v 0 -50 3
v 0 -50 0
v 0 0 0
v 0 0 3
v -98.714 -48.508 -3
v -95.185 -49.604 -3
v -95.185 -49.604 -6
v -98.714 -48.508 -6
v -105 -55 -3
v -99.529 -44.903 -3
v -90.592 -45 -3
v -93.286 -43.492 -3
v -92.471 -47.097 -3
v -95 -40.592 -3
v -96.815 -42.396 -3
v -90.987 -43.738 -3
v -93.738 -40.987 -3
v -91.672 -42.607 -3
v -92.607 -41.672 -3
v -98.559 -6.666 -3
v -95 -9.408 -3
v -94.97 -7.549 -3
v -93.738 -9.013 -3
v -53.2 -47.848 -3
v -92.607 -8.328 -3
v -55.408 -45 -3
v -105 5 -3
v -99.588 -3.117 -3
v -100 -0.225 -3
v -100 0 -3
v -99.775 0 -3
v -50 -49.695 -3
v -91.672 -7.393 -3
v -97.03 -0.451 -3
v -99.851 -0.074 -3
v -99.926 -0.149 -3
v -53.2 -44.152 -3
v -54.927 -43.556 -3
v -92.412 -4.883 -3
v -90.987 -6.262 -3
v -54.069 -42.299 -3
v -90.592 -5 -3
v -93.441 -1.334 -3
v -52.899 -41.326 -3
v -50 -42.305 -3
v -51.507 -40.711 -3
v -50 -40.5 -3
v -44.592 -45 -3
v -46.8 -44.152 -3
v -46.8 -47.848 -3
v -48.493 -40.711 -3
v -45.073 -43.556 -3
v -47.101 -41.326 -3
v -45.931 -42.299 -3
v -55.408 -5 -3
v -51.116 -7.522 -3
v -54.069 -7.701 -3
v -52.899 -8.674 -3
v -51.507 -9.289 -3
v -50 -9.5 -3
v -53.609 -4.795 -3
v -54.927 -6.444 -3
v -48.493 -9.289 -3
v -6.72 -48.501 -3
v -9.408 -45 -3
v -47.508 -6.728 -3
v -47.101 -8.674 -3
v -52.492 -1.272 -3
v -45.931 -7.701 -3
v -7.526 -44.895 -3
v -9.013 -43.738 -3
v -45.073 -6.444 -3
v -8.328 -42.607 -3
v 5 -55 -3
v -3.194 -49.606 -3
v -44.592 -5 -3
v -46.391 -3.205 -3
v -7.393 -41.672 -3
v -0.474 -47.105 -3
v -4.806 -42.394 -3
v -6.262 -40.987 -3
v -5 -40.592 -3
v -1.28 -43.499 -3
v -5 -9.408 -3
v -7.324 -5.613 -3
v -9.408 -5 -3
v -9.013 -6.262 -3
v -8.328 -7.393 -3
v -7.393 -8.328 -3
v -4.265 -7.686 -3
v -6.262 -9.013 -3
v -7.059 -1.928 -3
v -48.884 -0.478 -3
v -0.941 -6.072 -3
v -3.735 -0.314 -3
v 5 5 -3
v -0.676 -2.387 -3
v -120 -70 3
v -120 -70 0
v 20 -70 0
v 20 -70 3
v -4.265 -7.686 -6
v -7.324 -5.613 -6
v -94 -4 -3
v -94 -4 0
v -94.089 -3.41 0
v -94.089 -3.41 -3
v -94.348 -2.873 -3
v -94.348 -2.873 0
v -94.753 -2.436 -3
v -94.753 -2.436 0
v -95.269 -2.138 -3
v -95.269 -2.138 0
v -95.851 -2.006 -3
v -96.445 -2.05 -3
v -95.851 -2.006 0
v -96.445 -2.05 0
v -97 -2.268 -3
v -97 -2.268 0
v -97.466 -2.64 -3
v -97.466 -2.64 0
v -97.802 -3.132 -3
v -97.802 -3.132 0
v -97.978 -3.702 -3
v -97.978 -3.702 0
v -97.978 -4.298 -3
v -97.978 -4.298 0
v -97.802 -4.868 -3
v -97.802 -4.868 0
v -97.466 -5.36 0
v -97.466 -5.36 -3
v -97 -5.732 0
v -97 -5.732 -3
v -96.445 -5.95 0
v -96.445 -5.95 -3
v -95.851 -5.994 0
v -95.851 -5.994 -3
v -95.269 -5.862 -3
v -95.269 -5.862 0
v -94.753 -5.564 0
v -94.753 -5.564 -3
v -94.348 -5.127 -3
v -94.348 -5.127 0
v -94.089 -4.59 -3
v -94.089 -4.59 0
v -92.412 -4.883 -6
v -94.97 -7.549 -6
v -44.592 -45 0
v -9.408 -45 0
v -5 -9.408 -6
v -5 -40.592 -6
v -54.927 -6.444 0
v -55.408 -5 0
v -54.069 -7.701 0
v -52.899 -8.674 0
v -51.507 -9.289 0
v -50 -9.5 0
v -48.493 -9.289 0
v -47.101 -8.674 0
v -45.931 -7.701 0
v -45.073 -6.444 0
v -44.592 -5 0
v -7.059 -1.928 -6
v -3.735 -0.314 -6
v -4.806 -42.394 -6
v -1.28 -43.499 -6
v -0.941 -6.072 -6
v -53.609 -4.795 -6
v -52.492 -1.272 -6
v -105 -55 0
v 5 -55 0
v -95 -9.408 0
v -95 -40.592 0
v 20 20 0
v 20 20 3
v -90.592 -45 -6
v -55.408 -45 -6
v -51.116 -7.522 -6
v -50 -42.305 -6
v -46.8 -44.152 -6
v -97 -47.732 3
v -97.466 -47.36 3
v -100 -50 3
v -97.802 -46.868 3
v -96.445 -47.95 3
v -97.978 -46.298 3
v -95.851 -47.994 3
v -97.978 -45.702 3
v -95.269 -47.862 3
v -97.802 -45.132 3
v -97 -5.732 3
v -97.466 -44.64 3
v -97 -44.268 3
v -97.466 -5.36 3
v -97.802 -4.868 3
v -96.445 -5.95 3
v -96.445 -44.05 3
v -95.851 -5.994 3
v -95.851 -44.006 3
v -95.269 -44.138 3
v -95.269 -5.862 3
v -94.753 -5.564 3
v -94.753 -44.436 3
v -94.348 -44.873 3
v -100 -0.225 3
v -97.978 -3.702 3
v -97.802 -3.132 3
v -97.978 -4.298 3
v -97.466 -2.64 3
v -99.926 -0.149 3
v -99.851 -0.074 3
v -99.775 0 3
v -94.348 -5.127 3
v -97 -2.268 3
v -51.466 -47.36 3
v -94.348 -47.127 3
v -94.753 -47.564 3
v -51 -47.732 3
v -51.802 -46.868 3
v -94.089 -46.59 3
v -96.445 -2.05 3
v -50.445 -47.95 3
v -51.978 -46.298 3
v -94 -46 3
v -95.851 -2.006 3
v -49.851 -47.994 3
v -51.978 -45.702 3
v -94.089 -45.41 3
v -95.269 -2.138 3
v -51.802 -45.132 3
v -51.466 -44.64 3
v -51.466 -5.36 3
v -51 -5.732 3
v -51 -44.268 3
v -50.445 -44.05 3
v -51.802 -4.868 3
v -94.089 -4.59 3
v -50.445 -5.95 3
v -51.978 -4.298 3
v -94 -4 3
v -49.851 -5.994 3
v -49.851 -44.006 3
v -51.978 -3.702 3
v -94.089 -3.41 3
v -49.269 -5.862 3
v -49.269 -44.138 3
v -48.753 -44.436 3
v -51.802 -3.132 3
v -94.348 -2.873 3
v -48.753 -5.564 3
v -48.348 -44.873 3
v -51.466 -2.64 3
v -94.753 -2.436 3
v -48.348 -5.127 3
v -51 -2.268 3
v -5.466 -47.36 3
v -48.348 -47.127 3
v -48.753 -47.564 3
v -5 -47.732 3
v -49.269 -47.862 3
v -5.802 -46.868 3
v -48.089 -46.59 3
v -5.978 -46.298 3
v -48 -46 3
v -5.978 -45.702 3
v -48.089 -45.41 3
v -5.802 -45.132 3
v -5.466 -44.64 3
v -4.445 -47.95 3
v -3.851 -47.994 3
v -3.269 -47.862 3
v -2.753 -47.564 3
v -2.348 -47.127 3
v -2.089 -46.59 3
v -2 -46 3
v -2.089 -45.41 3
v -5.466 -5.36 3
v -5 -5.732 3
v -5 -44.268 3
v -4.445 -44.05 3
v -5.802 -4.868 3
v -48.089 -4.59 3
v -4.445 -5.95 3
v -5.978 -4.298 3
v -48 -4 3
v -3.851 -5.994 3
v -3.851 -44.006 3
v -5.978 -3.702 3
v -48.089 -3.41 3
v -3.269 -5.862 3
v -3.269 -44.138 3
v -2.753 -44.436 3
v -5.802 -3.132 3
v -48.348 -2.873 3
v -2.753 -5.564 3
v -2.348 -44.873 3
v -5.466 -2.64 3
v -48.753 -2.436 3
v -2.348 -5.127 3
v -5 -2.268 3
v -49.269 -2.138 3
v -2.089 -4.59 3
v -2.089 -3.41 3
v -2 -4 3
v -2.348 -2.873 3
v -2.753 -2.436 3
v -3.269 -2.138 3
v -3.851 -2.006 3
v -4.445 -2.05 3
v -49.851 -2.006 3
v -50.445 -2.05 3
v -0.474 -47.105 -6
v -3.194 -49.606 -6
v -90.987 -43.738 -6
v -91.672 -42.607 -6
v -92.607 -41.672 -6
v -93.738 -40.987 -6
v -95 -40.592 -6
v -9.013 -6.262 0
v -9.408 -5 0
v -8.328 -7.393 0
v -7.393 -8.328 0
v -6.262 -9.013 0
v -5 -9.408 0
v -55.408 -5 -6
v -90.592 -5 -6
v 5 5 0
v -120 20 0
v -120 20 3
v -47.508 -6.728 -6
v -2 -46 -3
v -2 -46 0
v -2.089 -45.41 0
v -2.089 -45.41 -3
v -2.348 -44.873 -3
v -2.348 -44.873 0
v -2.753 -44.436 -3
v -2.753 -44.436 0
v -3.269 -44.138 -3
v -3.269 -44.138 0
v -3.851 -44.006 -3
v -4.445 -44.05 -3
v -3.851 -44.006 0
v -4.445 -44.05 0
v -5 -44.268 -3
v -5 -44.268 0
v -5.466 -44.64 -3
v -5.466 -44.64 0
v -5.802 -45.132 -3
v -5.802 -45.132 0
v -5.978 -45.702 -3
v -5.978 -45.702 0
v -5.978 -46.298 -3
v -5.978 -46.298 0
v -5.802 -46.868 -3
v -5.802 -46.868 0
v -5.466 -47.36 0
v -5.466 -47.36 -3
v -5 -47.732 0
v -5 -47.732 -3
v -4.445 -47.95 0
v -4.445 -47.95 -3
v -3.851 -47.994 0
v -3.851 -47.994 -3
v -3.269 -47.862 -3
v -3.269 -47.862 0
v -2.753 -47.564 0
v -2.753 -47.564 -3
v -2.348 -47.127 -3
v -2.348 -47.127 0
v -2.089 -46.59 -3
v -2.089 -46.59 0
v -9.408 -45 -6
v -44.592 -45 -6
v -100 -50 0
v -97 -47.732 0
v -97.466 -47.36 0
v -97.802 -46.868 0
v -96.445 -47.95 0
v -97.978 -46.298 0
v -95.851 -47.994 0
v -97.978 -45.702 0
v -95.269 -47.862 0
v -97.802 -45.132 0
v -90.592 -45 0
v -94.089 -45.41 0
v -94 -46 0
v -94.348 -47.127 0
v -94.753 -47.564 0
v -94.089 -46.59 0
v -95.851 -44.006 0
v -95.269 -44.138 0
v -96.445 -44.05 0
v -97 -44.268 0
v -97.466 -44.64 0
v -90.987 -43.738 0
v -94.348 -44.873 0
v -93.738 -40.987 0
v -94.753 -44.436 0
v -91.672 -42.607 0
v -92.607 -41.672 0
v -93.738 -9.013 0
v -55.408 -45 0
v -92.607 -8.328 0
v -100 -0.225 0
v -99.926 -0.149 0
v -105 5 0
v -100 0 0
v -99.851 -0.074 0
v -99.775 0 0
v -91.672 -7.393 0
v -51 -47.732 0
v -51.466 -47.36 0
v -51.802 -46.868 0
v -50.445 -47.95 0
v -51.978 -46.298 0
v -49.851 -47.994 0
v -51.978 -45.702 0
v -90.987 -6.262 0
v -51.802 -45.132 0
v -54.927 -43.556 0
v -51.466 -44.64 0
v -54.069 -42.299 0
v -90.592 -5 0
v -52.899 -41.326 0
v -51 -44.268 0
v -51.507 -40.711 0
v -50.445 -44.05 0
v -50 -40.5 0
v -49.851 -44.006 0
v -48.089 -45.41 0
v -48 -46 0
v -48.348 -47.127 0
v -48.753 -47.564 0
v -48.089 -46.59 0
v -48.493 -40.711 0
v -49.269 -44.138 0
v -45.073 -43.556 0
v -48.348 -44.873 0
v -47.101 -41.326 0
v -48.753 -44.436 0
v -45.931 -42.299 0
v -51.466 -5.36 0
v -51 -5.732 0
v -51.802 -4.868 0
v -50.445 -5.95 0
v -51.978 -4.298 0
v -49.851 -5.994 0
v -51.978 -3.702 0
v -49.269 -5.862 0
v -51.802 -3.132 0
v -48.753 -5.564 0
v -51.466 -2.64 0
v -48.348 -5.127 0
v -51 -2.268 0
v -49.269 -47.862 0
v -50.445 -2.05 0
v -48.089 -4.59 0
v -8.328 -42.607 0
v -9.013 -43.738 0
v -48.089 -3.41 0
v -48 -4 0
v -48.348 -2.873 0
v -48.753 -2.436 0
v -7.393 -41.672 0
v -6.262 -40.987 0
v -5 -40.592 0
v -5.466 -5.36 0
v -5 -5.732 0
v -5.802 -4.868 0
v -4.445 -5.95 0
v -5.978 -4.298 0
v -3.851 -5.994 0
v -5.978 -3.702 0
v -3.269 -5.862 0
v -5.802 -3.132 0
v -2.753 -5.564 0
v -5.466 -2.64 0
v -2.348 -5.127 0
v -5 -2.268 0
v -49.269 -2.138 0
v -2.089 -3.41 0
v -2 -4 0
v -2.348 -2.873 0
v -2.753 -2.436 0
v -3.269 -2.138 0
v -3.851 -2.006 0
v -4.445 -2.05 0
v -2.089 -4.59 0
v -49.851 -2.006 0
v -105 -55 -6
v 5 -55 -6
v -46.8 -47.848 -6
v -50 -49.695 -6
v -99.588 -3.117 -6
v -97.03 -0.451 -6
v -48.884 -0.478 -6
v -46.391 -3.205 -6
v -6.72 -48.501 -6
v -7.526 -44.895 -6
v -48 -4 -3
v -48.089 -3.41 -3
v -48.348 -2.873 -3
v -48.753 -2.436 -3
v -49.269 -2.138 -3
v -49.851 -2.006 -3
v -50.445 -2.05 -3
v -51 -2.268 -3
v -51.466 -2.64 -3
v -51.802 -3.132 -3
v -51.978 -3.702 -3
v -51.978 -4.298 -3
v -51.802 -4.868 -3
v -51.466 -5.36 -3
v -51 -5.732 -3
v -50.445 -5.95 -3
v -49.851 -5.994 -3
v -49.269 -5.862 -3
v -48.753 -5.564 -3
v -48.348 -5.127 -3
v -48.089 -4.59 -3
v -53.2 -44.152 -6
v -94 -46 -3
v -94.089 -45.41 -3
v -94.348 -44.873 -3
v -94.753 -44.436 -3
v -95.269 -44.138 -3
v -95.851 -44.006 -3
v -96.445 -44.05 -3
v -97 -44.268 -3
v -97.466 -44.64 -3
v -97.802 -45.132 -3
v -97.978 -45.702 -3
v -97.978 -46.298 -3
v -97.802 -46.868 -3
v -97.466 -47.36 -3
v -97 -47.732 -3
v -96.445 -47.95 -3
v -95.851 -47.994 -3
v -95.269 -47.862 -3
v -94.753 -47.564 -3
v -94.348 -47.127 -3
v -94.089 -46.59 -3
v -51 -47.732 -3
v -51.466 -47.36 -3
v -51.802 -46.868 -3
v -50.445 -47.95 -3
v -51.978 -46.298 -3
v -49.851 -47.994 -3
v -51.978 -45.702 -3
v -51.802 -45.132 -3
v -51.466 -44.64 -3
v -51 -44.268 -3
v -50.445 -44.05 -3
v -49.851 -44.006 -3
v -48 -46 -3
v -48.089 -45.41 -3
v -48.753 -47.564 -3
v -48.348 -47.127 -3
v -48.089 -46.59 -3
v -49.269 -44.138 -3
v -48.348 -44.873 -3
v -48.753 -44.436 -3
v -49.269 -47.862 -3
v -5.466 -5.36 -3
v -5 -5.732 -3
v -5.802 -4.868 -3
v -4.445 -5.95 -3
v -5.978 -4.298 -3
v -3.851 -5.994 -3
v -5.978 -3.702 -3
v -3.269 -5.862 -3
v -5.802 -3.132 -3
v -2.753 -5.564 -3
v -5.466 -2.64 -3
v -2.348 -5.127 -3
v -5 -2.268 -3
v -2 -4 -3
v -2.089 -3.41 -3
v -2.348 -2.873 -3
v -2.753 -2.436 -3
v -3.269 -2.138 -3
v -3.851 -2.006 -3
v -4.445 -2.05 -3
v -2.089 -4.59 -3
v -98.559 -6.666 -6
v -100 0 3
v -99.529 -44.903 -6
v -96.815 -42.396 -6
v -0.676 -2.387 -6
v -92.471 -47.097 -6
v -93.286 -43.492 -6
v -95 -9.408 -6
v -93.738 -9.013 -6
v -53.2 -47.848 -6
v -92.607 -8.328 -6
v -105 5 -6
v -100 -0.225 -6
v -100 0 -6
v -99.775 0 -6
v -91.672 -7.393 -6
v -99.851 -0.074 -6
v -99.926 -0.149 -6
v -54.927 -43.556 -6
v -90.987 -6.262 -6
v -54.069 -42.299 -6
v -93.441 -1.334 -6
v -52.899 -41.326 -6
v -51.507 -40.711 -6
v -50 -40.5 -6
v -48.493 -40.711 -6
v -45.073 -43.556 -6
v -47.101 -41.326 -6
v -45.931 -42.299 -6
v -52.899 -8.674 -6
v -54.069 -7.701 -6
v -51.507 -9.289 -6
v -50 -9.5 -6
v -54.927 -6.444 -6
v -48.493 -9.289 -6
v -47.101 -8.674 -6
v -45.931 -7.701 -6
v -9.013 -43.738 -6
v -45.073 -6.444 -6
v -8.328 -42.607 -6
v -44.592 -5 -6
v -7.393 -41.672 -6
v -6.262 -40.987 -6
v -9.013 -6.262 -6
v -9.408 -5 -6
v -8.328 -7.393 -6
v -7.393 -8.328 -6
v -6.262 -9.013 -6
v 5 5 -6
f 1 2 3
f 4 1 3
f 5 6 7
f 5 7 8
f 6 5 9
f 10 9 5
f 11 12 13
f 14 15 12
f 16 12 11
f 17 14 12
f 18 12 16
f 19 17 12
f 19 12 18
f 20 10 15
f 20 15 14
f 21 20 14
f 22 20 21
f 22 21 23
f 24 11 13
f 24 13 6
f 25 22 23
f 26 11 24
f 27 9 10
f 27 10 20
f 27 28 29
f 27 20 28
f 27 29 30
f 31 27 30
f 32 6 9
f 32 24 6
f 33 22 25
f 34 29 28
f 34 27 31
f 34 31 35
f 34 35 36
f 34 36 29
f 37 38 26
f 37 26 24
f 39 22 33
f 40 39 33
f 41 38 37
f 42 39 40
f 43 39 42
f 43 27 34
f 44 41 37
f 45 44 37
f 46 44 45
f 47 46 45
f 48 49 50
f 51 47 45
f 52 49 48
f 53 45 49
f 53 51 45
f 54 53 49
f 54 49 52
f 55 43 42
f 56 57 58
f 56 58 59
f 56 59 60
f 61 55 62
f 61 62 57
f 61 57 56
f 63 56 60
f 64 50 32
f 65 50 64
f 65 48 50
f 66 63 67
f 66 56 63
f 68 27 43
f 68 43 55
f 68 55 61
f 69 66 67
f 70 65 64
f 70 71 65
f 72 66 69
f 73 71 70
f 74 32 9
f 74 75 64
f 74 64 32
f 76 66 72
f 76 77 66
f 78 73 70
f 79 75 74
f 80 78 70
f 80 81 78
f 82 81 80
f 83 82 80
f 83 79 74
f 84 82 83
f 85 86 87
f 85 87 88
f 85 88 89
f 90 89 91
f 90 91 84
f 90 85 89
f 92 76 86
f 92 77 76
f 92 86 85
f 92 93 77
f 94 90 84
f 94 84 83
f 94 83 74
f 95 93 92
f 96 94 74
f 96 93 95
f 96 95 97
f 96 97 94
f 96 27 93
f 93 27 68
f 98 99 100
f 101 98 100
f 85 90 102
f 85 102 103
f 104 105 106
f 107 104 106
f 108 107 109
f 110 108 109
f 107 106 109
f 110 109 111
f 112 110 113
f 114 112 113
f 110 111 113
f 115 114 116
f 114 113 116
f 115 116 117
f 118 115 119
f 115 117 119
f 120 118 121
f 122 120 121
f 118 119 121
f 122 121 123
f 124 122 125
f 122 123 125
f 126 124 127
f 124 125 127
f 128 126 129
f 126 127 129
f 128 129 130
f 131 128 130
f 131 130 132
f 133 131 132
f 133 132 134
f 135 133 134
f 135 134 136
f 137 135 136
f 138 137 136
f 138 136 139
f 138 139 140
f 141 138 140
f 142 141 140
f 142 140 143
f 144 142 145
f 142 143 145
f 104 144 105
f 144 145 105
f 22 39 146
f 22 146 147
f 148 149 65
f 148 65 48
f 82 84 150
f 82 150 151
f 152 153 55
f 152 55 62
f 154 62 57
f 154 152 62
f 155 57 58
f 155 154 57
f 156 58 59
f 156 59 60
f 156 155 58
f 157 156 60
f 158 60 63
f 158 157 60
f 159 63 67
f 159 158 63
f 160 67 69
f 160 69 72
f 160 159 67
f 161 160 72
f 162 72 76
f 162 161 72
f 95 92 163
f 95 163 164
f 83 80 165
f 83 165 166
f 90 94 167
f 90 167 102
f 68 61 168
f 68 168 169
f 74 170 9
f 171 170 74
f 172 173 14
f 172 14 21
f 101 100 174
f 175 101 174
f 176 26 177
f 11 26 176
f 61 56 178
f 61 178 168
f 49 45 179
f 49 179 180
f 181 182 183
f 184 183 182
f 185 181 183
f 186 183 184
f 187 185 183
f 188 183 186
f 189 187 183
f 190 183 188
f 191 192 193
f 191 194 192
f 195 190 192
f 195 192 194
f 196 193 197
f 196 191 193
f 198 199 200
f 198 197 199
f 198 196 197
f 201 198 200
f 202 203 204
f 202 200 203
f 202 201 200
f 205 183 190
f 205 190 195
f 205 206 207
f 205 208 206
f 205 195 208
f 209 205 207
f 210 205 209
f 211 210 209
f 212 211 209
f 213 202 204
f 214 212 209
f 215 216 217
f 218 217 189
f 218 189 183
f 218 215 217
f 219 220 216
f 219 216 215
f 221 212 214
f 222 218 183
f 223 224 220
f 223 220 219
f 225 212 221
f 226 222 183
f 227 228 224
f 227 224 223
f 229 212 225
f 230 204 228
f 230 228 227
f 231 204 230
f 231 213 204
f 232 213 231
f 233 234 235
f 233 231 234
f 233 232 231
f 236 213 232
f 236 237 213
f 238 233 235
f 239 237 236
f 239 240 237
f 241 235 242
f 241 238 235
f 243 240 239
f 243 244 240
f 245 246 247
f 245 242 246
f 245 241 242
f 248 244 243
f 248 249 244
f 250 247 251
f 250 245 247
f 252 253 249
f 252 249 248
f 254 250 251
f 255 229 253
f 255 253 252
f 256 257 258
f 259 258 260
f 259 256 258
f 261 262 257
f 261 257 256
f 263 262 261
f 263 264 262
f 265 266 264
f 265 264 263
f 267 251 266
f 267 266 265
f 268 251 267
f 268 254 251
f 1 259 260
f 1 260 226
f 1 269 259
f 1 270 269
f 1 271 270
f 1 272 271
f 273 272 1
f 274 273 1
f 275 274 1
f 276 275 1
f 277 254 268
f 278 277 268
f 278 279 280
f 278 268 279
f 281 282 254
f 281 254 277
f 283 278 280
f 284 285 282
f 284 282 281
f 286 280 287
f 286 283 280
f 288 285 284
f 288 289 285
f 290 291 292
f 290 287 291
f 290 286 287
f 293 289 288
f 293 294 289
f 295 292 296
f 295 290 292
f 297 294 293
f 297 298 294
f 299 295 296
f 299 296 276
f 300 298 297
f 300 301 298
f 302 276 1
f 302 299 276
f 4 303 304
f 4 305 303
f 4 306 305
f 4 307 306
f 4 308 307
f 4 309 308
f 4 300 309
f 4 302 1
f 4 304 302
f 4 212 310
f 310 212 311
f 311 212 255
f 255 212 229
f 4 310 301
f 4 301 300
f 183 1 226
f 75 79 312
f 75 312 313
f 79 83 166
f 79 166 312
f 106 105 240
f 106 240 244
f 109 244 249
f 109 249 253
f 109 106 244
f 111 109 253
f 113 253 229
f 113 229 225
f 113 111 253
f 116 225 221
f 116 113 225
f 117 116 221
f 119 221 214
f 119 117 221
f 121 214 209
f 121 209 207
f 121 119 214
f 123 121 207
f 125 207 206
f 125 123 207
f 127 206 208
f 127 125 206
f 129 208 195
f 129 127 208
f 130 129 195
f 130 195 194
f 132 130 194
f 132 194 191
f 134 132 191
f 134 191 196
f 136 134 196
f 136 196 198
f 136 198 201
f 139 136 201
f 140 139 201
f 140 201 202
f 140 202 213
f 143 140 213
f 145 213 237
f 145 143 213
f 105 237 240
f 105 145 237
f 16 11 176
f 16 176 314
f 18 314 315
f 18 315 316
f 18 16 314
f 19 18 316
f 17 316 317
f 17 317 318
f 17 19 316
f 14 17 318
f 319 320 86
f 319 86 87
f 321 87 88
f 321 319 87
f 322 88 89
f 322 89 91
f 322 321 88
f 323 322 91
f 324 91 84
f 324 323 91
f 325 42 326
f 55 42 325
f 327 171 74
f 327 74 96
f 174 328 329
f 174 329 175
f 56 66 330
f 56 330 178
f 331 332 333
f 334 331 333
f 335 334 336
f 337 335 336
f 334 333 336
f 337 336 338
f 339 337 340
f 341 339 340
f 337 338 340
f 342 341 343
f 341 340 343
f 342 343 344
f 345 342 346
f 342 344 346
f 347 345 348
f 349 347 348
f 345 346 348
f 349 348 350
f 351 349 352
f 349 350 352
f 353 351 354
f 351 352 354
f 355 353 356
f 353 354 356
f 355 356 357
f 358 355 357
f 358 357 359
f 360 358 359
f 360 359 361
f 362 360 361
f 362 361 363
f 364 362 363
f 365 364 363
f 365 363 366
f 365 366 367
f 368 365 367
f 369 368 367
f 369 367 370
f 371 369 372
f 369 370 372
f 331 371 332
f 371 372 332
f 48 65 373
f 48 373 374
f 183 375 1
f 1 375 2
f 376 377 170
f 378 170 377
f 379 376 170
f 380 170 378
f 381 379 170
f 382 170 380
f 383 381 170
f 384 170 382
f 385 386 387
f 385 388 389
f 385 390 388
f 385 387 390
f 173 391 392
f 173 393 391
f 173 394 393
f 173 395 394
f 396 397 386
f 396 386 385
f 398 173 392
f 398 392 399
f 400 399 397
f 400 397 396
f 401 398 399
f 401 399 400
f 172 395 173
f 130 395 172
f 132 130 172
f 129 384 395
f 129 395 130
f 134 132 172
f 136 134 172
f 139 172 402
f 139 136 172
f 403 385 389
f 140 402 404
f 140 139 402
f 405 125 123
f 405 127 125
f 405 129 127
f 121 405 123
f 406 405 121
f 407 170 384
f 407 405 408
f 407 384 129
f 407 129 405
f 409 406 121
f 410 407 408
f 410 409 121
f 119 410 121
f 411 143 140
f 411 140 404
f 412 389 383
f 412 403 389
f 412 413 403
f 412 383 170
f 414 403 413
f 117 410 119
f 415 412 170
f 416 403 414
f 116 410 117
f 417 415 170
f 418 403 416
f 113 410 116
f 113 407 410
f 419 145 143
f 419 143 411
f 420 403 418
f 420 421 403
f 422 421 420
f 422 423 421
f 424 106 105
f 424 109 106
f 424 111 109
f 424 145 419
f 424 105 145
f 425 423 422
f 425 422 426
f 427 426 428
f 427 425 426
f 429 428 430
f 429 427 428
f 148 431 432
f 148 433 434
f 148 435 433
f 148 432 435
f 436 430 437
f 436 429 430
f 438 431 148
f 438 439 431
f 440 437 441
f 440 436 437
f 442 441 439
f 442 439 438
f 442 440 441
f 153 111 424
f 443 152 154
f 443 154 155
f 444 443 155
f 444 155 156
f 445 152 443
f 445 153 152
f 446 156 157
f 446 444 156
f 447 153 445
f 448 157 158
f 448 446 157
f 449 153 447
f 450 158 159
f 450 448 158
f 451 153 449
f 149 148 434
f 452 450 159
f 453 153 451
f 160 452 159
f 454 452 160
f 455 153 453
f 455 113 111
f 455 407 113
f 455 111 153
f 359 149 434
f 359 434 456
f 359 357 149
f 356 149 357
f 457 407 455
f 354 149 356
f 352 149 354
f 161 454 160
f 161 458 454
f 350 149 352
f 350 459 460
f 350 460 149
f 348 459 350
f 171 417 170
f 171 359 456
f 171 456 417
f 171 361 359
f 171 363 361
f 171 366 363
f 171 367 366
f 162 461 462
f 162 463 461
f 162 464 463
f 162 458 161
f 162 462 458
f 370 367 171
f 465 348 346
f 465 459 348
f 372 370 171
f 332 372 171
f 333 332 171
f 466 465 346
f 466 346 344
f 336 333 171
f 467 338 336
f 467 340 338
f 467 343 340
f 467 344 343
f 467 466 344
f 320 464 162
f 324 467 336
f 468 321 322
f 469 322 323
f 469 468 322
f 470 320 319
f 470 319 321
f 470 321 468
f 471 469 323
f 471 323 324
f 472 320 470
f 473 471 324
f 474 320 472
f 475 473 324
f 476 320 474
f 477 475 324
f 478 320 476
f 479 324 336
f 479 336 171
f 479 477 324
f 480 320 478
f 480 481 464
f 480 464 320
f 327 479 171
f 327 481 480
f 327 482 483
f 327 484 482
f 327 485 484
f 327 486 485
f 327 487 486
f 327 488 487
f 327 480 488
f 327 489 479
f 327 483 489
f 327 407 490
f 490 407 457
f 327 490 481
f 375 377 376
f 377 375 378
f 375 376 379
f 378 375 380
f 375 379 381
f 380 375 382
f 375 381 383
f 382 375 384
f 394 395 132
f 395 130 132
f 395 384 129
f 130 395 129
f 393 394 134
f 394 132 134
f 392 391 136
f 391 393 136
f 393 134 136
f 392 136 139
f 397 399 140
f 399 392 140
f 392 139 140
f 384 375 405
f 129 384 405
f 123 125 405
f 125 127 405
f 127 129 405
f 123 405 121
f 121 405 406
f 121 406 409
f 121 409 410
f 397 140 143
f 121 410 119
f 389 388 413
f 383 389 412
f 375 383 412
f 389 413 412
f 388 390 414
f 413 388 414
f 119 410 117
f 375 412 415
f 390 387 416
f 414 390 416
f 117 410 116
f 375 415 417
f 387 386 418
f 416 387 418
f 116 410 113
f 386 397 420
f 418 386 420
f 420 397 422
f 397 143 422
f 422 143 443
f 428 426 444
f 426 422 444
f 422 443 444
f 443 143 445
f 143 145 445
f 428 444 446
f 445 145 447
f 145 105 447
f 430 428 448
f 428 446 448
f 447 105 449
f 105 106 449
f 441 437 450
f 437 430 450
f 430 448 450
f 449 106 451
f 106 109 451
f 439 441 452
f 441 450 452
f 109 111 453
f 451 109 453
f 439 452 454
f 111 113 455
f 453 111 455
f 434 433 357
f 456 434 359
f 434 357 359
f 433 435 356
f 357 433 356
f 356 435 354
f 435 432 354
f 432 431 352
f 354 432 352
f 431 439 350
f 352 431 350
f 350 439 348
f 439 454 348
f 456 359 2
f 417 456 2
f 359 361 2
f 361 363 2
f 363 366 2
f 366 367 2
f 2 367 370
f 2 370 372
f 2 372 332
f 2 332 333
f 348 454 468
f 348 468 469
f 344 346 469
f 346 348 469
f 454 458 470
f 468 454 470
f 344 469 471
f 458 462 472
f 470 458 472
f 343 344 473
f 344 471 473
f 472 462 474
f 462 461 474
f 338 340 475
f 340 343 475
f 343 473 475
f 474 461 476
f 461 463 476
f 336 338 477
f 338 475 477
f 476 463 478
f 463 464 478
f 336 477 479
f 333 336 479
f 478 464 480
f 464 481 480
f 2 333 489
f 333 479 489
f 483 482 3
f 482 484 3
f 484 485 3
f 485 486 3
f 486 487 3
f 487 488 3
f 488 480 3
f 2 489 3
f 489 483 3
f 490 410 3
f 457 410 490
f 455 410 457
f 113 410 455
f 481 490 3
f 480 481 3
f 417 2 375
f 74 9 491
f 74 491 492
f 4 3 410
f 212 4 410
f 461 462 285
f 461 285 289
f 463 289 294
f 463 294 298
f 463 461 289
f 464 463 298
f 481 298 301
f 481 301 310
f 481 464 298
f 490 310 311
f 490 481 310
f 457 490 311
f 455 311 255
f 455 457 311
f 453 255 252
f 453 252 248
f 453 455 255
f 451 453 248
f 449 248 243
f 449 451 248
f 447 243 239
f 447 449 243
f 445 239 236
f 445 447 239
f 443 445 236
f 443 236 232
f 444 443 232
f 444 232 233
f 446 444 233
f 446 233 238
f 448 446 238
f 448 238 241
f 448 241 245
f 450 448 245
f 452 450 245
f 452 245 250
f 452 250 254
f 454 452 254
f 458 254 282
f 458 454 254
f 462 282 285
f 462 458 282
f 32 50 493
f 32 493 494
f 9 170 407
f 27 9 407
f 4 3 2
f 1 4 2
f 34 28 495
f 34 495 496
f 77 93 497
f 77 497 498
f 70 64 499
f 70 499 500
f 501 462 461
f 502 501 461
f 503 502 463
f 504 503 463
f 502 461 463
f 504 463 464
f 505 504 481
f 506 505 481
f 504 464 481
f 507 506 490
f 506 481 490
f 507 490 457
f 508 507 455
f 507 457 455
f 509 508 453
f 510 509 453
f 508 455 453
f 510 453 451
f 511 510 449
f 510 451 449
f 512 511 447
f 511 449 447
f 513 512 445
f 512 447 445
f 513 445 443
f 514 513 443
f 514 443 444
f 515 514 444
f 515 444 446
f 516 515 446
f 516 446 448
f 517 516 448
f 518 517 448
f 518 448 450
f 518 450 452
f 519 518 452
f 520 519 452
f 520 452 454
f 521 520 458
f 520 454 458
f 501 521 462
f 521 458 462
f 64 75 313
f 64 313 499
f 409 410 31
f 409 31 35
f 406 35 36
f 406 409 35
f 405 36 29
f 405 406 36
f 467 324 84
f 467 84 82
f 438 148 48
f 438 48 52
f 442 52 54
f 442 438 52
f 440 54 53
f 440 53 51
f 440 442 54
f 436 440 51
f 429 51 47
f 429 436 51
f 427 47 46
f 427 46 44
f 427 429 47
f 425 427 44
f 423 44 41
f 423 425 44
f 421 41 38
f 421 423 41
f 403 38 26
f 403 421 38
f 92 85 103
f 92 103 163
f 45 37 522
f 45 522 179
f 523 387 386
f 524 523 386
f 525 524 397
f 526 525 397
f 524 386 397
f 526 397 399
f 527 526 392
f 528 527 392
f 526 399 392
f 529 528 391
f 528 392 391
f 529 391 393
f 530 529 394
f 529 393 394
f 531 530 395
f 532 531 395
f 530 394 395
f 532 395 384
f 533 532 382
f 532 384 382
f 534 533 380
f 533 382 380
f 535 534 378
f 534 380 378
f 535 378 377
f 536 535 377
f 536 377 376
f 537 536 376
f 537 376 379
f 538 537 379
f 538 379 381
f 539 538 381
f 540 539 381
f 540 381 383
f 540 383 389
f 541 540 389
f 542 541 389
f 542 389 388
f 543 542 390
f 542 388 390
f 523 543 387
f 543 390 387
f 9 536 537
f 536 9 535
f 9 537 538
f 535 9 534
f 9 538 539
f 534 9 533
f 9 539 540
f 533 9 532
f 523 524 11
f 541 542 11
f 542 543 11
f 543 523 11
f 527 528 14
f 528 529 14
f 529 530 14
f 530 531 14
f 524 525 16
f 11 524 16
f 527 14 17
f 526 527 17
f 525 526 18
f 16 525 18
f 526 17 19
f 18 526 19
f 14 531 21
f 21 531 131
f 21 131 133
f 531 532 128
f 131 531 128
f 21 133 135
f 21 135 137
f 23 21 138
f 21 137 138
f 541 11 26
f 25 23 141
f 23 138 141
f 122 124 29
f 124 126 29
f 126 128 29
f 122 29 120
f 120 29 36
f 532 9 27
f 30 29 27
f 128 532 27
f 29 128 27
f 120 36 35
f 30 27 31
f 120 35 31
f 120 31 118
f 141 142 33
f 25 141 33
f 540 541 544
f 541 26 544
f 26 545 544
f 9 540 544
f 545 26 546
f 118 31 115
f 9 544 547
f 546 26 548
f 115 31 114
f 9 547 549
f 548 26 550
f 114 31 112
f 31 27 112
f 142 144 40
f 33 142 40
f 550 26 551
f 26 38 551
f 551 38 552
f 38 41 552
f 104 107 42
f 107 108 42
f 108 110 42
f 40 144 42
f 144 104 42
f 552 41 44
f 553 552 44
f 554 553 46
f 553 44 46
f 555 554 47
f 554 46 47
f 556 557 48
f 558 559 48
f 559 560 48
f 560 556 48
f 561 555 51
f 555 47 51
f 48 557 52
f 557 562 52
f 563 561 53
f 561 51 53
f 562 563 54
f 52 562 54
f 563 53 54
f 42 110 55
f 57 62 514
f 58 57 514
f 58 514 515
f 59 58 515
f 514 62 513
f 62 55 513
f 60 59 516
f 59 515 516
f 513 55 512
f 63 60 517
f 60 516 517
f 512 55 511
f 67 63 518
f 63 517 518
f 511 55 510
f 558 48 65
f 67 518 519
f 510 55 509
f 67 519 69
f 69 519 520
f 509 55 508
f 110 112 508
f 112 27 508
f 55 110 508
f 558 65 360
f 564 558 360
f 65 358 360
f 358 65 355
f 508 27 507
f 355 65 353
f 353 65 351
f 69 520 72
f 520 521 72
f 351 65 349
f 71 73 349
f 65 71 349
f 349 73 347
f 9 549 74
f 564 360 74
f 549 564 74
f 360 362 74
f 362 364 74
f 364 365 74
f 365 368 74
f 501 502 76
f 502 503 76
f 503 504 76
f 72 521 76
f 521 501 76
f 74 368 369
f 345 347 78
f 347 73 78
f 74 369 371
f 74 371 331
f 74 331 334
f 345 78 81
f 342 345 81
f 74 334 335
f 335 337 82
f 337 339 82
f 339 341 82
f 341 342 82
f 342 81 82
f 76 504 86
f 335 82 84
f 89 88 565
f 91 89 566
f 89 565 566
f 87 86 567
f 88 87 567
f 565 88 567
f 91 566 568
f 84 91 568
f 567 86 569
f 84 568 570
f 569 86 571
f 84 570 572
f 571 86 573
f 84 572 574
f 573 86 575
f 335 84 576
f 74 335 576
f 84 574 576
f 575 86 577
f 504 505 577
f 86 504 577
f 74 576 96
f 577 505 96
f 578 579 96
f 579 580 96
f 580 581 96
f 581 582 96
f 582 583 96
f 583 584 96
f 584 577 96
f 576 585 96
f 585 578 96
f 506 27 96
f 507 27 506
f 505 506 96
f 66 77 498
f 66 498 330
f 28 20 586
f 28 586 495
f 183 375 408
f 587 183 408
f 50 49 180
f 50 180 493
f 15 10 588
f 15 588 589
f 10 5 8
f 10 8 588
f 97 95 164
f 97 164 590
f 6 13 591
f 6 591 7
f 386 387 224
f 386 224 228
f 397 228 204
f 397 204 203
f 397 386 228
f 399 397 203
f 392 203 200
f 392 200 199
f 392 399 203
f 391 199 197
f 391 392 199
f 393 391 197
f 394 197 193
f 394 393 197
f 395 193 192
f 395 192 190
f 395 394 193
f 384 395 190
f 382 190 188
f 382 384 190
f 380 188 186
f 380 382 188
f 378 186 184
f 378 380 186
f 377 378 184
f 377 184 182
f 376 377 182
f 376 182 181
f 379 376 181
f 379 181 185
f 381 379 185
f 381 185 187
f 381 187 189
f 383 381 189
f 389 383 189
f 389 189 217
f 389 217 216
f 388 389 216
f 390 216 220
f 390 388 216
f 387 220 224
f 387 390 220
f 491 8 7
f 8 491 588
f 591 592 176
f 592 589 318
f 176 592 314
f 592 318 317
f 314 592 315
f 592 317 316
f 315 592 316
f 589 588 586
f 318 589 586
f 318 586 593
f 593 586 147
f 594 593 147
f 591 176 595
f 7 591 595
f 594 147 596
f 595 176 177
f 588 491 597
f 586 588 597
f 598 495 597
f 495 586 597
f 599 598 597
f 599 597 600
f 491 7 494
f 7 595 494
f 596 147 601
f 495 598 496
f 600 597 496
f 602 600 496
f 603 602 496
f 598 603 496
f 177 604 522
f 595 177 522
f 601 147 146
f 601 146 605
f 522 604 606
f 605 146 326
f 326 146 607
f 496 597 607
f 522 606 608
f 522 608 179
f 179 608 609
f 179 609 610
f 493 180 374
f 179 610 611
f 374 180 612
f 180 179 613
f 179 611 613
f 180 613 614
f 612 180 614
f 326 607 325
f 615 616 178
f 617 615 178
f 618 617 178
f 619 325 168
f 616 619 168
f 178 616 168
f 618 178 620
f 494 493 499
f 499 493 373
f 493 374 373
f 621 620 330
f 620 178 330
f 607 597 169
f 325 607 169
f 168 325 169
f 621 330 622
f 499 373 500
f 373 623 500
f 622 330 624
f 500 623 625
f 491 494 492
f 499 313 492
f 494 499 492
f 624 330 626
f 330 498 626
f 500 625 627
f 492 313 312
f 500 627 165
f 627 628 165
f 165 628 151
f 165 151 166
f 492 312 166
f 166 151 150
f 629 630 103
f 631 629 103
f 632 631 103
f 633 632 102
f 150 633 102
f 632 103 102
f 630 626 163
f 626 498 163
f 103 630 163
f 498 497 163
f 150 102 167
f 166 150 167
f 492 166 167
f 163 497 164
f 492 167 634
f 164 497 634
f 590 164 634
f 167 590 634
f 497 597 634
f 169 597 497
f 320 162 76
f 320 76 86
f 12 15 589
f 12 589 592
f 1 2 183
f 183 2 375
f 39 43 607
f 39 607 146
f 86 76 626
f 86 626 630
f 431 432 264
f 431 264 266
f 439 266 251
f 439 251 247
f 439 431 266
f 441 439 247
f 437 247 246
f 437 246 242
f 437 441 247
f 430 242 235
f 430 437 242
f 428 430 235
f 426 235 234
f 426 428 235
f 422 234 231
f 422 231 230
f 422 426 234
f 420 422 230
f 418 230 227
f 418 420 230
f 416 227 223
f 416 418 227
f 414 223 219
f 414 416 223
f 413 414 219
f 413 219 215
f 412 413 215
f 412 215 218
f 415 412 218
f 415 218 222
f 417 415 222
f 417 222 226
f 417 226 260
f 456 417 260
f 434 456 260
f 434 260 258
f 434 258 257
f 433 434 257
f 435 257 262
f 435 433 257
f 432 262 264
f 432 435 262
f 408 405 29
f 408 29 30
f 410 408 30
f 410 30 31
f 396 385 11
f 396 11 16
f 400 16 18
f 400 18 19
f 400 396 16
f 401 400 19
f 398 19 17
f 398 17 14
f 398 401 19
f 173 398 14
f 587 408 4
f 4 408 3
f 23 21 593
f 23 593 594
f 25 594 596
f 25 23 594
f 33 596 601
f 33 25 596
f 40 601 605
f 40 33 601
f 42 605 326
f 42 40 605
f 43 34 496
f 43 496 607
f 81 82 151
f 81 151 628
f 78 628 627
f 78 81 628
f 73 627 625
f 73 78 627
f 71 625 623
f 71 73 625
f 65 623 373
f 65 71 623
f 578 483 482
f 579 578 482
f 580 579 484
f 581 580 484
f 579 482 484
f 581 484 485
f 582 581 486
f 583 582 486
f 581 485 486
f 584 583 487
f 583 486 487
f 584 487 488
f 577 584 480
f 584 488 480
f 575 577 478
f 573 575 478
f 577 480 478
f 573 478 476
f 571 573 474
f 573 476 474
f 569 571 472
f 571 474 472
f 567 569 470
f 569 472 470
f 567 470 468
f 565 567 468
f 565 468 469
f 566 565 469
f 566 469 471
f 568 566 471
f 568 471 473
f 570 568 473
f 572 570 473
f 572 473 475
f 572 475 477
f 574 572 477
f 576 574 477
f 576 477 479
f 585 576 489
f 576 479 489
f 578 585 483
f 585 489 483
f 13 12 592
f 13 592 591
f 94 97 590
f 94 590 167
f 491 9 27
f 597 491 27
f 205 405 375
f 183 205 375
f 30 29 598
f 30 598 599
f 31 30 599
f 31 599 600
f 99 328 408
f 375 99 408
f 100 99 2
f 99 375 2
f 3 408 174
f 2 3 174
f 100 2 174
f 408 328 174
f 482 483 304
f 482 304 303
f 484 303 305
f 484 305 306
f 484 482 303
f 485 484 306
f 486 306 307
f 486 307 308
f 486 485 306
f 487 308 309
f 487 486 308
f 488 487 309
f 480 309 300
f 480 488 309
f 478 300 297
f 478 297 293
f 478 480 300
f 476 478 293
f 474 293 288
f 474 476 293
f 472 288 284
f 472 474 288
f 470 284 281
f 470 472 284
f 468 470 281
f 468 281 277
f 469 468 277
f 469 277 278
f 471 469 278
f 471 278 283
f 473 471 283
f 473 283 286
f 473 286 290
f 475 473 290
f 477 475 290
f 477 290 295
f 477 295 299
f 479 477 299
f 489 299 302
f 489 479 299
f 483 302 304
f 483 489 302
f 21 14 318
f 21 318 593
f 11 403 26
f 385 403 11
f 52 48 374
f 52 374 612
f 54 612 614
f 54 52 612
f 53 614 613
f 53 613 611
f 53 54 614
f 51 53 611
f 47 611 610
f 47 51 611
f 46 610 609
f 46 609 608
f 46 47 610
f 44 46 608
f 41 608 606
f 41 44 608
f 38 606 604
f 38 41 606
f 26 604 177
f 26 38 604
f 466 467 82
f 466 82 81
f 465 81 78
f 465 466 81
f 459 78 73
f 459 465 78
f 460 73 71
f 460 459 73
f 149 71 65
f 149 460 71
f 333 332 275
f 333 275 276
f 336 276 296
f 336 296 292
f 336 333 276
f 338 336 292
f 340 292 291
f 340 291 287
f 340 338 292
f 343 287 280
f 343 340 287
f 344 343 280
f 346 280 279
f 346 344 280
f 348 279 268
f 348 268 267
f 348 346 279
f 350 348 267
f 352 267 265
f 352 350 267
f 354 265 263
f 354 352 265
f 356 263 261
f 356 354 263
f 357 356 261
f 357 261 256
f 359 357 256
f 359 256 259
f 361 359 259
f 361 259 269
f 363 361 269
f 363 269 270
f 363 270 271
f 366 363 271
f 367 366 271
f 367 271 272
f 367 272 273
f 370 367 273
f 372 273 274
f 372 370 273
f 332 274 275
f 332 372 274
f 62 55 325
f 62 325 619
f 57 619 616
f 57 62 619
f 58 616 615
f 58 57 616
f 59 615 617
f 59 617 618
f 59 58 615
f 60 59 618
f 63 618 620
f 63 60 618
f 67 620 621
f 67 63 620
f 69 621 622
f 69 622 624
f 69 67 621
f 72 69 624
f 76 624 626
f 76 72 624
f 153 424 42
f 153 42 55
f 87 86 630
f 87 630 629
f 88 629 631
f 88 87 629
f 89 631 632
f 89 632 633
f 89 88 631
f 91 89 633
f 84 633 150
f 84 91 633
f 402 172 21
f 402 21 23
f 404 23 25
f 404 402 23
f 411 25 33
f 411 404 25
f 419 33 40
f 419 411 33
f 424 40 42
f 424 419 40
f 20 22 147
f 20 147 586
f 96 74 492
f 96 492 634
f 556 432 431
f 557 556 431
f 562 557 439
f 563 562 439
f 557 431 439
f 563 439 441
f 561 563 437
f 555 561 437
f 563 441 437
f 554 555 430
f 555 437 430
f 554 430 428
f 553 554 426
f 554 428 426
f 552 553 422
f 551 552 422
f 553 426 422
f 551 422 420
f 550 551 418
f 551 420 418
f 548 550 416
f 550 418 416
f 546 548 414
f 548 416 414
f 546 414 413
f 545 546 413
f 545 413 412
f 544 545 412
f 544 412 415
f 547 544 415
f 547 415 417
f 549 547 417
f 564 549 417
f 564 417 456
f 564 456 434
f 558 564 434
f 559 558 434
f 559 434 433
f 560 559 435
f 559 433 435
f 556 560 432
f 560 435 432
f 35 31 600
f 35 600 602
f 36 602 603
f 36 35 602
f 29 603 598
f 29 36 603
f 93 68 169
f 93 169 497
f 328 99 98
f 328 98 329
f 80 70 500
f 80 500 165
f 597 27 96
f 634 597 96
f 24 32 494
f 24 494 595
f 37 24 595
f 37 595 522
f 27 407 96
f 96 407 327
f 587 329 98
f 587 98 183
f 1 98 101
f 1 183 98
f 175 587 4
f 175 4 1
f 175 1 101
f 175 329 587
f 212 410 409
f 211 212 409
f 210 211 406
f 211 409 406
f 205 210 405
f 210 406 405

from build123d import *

# Parameters (mm, degrees)
F0_W     = 140
F0_H     = 90
F0_W_2   = 110
F0_H_2   = 60
F1_DEPTH = 3
F0_R     = 2
F2_DEPTH = 3
F3_DEPTH = 3
F4_START = -3
F4_DEPTH = 3


with BuildPart() as f1:
    # F0 (on Top) → F1 (new body)
    with BuildSketch(Plane.XY):
        with Locations((-50, -25)):
            Rectangle(F0_W, F0_H)
        with Locations((-50, -25)):
            Rectangle(F0_W_2, F0_H_2, mode=Mode.SUBTRACT)
        with Locations((-50, -25)):
            Rectangle(F0_W_2, F0_H_2)
        Polygon((-99.7749172176, 0), (0, 0), (0, -50), (-100, -50), (-100, -0.2250827824), (-100, 0), align=None, mode=Mode.SUBTRACT)
    extrude(amount=F1_DEPTH)


with BuildPart() as f2:
    # F0 (on Top) → F2 (new body)
    with BuildSketch(Plane.XY):
        with Locations((-50, -25)):
            Rectangle(F0_W_2, F0_H_2)
        Polygon((-99.7749172176, 0), (0, 0), (0, -50), (-100, -50), (-100, -0.2250827824), (-100, 0), align=None, mode=Mode.SUBTRACT)
        with BuildLine():
            Line((0, -50), (0, 0))
            Line((0, 0), (-99.7749172176, 0))
            ThreePointArc((-99.7749172176, 0), (-99.8890872965, -0.1109127035), (-100, -0.2250827824))
            Line((-100, -0.2250827824), (-100, -50))
            Line((-100, -50), (0, -50))
        make_face()
        Polygon((-99.5285949818, -44.9034824272), (-96.8146854172, -42.3958883197), (-93.2860904353, -43.4924058925), (-92.4714050182, -47.0965175728), (-95.1853145828, -49.6041116803), (-98.7139095647, -48.5075941075), align=None, mode=Mode.SUBTRACT)
        Polygon((-50, -42.3049582772), (-46.8, -44.1524791386), (-46.8, -47.8475208614), (-50, -49.6950417228), (-53.2, -47.8475208614), (-53.2, -44.1524791386), align=None, mode=Mode.SUBTRACT)
        Polygon((-6.7200378526, -48.500945304), (-7.5259010931, -44.8948507724), (-4.8058632405, -42.3939054684), (-1.2799621474, -43.499054696), (-0.4740989069, -47.1051492276), (-3.1941367595, -49.6060945316), align=None, mode=Mode.SUBTRACT)
        Polygon((-93.441469611, -1.334056343), (-92.4119598735, -4.8827804847), (-94.9704902625, -7.5487241417), (-98.558530389, -6.665943657), (-99.5880401265, -3.1172195153), (-97.0295097375, -0.4512758583), align=None, mode=Mode.SUBTRACT)
        with BuildLine():
            Line((-44.5916730868, -5), (-9.4083269132, -5))
            ThreePointArc((-9.4083269132, -5), (-7.8890872965, -7.8890872965), (-5, -9.4083269132))
            Line((-5, -9.4083269132), (-5, -40.5916730868))
            ThreePointArc((-5, -40.5916730868), (-7.8890872965, -42.1109127035), (-9.4083269132, -45))
            Line((-9.4083269132, -45), (-44.5916730868, -45))
            ThreePointArc((-44.5916730868, -45), (-50, -40.5), (-55.4083269132, -45))
            Line((-55.4083269132, -45), (-90.5916730868, -45))
            ThreePointArc((-90.5916730868, -45), (-92.1109127035, -42.1109127035), (-95, -40.5916730868))
            Line((-95, -40.5916730868), (-95, -9.4083269132))
            ThreePointArc((-95, -9.4083269132), (-92.1109127035, -7.8890872965), (-90.5916730868, -5))
            Line((-90.5916730868, -5), (-55.4083269132, -5))
            ThreePointArc((-55.4083269132, -5), (-50, -9.5), (-44.5916730868, -5))
        make_face(mode=Mode.SUBTRACT)
        Polygon((-46.3913899472, -3.2054769858), (-47.5076178594, -6.727886471), (-51.1162279122, -7.5224094852), (-53.6086100528, -4.7945230142), (-52.4923821406, -1.272113529), (-48.8837720878, -0.4775905148), align=None, mode=Mode.SUBTRACT)
        Polygon((-0.6758070303, -2.3865953906), (-0.9406541368, -6.0721332541), (-4.2648471065, -7.6855378635), (-7.3241929697, -5.6134046094), (-7.0593458632, -1.9278667459), (-3.7351528935, -0.3144621365), align=None, mode=Mode.SUBTRACT)
        Polygon((-93.2860904353, -43.4924058925), (-96.8146854172, -42.3958883197), (-99.5285949818, -44.9034824272), (-98.7139095647, -48.5075941075), (-95.1853145828, -49.6041116803), (-92.4714050182, -47.0965175728), align=None)
        with Locations((-96, -46)):
            Circle(F0_R, mode=Mode.SUBTRACT)
        Polygon((-94.9704902625, -7.5487241417), (-92.4119598735, -4.8827804847), (-93.441469611, -1.334056343), (-97.0295097375, -0.4512758583), (-99.5880401265, -3.1172195153), (-98.558530389, -6.665943657), align=None)
        with Locations((-96, -4)):
            Circle(F0_R, mode=Mode.SUBTRACT)
        Polygon((-46.8, -47.8475208614), (-46.8, -44.1524791386), (-50, -42.3049582772), (-53.2, -44.1524791386), (-53.2, -47.8475208614), (-50, -49.6950417228), align=None)
        with Locations((-50, -46)):
            Circle(F0_R, mode=Mode.SUBTRACT)
        Polygon((-51.1162279122, -7.5224094852), (-47.5076178594, -6.727886471), (-46.3913899472, -3.2054769858), (-48.8837720878, -0.4775905148), (-52.4923821406, -1.272113529), (-53.6086100528, -4.7945230142), align=None)
        with Locations((-50, -4)):
            Circle(F0_R, mode=Mode.SUBTRACT)
        Polygon((-4.2648471065, -7.6855378635), (-0.9406541368, -6.0721332541), (-0.6758070303, -2.3865953906), (-3.7351528935, -0.3144621365), (-7.0593458632, -1.9278667459), (-7.3241929697, -5.6134046094), align=None)
        with Locations((-4, -4)):
            Circle(F0_R, mode=Mode.SUBTRACT)
        Polygon((-4.8058632405, -42.3939054684), (-7.5259010931, -44.8948507724), (-6.7200378526, -48.500945304), (-3.1941367595, -49.6060945316), (-0.4740989069, -47.1051492276), (-1.2799621474, -43.499054696), align=None)
        with Locations((-4, -46)):
            Circle(F0_R, mode=Mode.SUBTRACT)
    extrude(amount=-F2_DEPTH)


with BuildPart() as f3:
    # F0 (on Top) → F3 (new body)
    with BuildSketch(Plane.XY):
        with BuildLine():
            Line((0, -50), (0, 0))
            Line((0, 0), (-99.7749172176, 0))
            ThreePointArc((-99.7749172176, 0), (-99.8890872965, -0.1109127035), (-100, -0.2250827824))
            Line((-100, -0.2250827824), (-100, -50))
            Line((-100, -50), (0, -50))
        make_face()
        Polygon((-99.5285949818, -44.9034824272), (-96.8146854172, -42.3958883197), (-93.2860904353, -43.4924058925), (-92.4714050182, -47.0965175728), (-95.1853145828, -49.6041116803), (-98.7139095647, -48.5075941075), align=None, mode=Mode.SUBTRACT)
        Polygon((-50, -42.3049582772), (-46.8, -44.1524791386), (-46.8, -47.8475208614), (-50, -49.6950417228), (-53.2, -47.8475208614), (-53.2, -44.1524791386), align=None, mode=Mode.SUBTRACT)
        Polygon((-6.7200378526, -48.500945304), (-7.5259010931, -44.8948507724), (-4.8058632405, -42.3939054684), (-1.2799621474, -43.499054696), (-0.4740989069, -47.1051492276), (-3.1941367595, -49.6060945316), align=None, mode=Mode.SUBTRACT)
        Polygon((-93.441469611, -1.334056343), (-92.4119598735, -4.8827804847), (-94.9704902625, -7.5487241417), (-98.558530389, -6.665943657), (-99.5880401265, -3.1172195153), (-97.0295097375, -0.4512758583), align=None, mode=Mode.SUBTRACT)
        with BuildLine():
            Line((-44.5916730868, -5), (-9.4083269132, -5))
            ThreePointArc((-9.4083269132, -5), (-7.8890872965, -7.8890872965), (-5, -9.4083269132))
            Line((-5, -9.4083269132), (-5, -40.5916730868))
            ThreePointArc((-5, -40.5916730868), (-7.8890872965, -42.1109127035), (-9.4083269132, -45))
            Line((-9.4083269132, -45), (-44.5916730868, -45))
            ThreePointArc((-44.5916730868, -45), (-50, -40.5), (-55.4083269132, -45))
            Line((-55.4083269132, -45), (-90.5916730868, -45))
            ThreePointArc((-90.5916730868, -45), (-92.1109127035, -42.1109127035), (-95, -40.5916730868))
            Line((-95, -40.5916730868), (-95, -9.4083269132))
            ThreePointArc((-95, -9.4083269132), (-92.1109127035, -7.8890872965), (-90.5916730868, -5))
            Line((-90.5916730868, -5), (-55.4083269132, -5))
            ThreePointArc((-55.4083269132, -5), (-50, -9.5), (-44.5916730868, -5))
        make_face(mode=Mode.SUBTRACT)
        Polygon((-46.3913899472, -3.2054769858), (-47.5076178594, -6.727886471), (-51.1162279122, -7.5224094852), (-53.6086100528, -4.7945230142), (-52.4923821406, -1.272113529), (-48.8837720878, -0.4775905148), align=None, mode=Mode.SUBTRACT)
        Polygon((-0.6758070303, -2.3865953906), (-0.9406541368, -6.0721332541), (-4.2648471065, -7.6855378635), (-7.3241929697, -5.6134046094), (-7.0593458632, -1.9278667459), (-3.7351528935, -0.3144621365), align=None, mode=Mode.SUBTRACT)
        with BuildLine():
            ThreePointArc((-5, -9.4083269132), (-7.8890872965, -7.8890872965), (-9.4083269132, -5))
            Line((-9.4083269132, -5), (-44.5916730868, -5))
            ThreePointArc((-44.5916730868, -5), (-50, -9.5), (-55.4083269132, -5))
            Line((-55.4083269132, -5), (-90.5916730868, -5))
            ThreePointArc((-90.5916730868, -5), (-92.1109127035, -7.8890872965), (-95, -9.4083269132))
            Line((-95, -9.4083269132), (-95, -40.5916730868))
            ThreePointArc((-95, -40.5916730868), (-92.1109127035, -42.1109127035), (-90.5916730868, -45))
            Line((-90.5916730868, -45), (-55.4083269132, -45))
            ThreePointArc((-55.4083269132, -45), (-50, -40.5), (-44.5916730868, -45))
            Line((-44.5916730868, -45), (-9.4083269132, -45))
            ThreePointArc((-9.4083269132, -45), (-7.8890872965, -42.1109127035), (-5, -40.5916730868))
            Line((-5, -40.5916730868), (-5, -9.4083269132))
        make_face()
        Polygon((-94.9704902625, -7.5487241417), (-92.4119598735, -4.8827804847), (-93.441469611, -1.334056343), (-97.0295097375, -0.4512758583), (-99.5880401265, -3.1172195153), (-98.558530389, -6.665943657), align=None)
        with Locations((-96, -4)):
            Circle(F0_R, mode=Mode.SUBTRACT)
        Polygon((-93.2860904353, -43.4924058925), (-96.8146854172, -42.3958883197), (-99.5285949818, -44.9034824272), (-98.7139095647, -48.5075941075), (-95.1853145828, -49.6041116803), (-92.4714050182, -47.0965175728), align=None)
        with Locations((-96, -46)):
            Circle(F0_R, mode=Mode.SUBTRACT)
        Polygon((-51.1162279122, -7.5224094852), (-47.5076178594, -6.727886471), (-46.3913899472, -3.2054769858), (-48.8837720878, -0.4775905148), (-52.4923821406, -1.272113529), (-53.6086100528, -4.7945230142), align=None)
        with Locations((-50, -4)):
            Circle(F0_R, mode=Mode.SUBTRACT)
        Polygon((-46.8, -47.8475208614), (-46.8, -44.1524791386), (-50, -42.3049582772), (-53.2, -44.1524791386), (-53.2, -47.8475208614), (-50, -49.6950417228), align=None)
        with Locations((-50, -46)):
            Circle(F0_R, mode=Mode.SUBTRACT)
        Polygon((-4.2648471065, -7.6855378635), (-0.9406541368, -6.0721332541), (-0.6758070303, -2.3865953906), (-3.7351528935, -0.3144621365), (-7.0593458632, -1.9278667459), (-7.3241929697, -5.6134046094), align=None)
        with Locations((-4, -4)):
            Circle(F0_R, mode=Mode.SUBTRACT)
        Polygon((-4.8058632405, -42.3939054684), (-7.5259010931, -44.8948507724), (-6.7200378526, -48.500945304), (-3.1941367595, -49.6060945316), (-0.4740989069, -47.1051492276), (-1.2799621474, -43.499054696), align=None)
        with Locations((-4, -46)):
            Circle(F0_R, mode=Mode.SUBTRACT)
    extrude(amount=F3_DEPTH)


with BuildPart() as f4:
    # F0 (on Top) → F4 (new body)
    with BuildSketch(Plane.XY.offset(F4_START)):
        with Locations((-50, -25)):
            Rectangle(F0_W_2, F0_H_2)
        Polygon((-99.7749172176, 0), (0, 0), (0, -50), (-100, -50), (-100, -0.2250827824), (-100, 0), align=None, mode=Mode.SUBTRACT)
        with BuildLine():
            Line((0, -50), (0, 0))
            Line((0, 0), (-99.7749172176, 0))
            ThreePointArc((-99.7749172176, 0), (-99.8890872965, -0.1109127035), (-100, -0.2250827824))
            Line((-100, -0.2250827824), (-100, -50))
            Line((-100, -50), (0, -50))
        make_face()
        Polygon((-99.5285949818, -44.9034824272), (-96.8146854172, -42.3958883197), (-93.2860904353, -43.4924058925), (-92.4714050182, -47.0965175728), (-95.1853145828, -49.6041116803), (-98.7139095647, -48.5075941075), align=None, mode=Mode.SUBTRACT)
        Polygon((-50, -42.3049582772), (-46.8, -44.1524791386), (-46.8, -47.8475208614), (-50, -49.6950417228), (-53.2, -47.8475208614), (-53.2, -44.1524791386), align=None, mode=Mode.SUBTRACT)
        Polygon((-6.7200378526, -48.500945304), (-7.5259010931, -44.8948507724), (-4.8058632405, -42.3939054684), (-1.2799621474, -43.499054696), (-0.4740989069, -47.1051492276), (-3.1941367595, -49.6060945316), align=None, mode=Mode.SUBTRACT)
        Polygon((-93.441469611, -1.334056343), (-92.4119598735, -4.8827804847), (-94.9704902625, -7.5487241417), (-98.558530389, -6.665943657), (-99.5880401265, -3.1172195153), (-97.0295097375, -0.4512758583), align=None, mode=Mode.SUBTRACT)
        with BuildLine():
            Line((-44.5916730868, -5), (-9.4083269132, -5))
            ThreePointArc((-9.4083269132, -5), (-7.8890872965, -7.8890872965), (-5, -9.4083269132))
            Line((-5, -9.4083269132), (-5, -40.5916730868))
            ThreePointArc((-5, -40.5916730868), (-7.8890872965, -42.1109127035), (-9.4083269132, -45))
            Line((-9.4083269132, -45), (-44.5916730868, -45))
            ThreePointArc((-44.5916730868, -45), (-50, -40.5), (-55.4083269132, -45))
            Line((-55.4083269132, -45), (-90.5916730868, -45))
            ThreePointArc((-90.5916730868, -45), (-92.1109127035, -42.1109127035), (-95, -40.5916730868))
            Line((-95, -40.5916730868), (-95, -9.4083269132))
            ThreePointArc((-95, -9.4083269132), (-92.1109127035, -7.8890872965), (-90.5916730868, -5))
            Line((-90.5916730868, -5), (-55.4083269132, -5))
            ThreePointArc((-55.4083269132, -5), (-50, -9.5), (-44.5916730868, -5))
        make_face(mode=Mode.SUBTRACT)
        Polygon((-46.3913899472, -3.2054769858), (-47.5076178594, -6.727886471), (-51.1162279122, -7.5224094852), (-53.6086100528, -4.7945230142), (-52.4923821406, -1.272113529), (-48.8837720878, -0.4775905148), align=None, mode=Mode.SUBTRACT)
        Polygon((-0.6758070303, -2.3865953906), (-0.9406541368, -6.0721332541), (-4.2648471065, -7.6855378635), (-7.3241929697, -5.6134046094), (-7.0593458632, -1.9278667459), (-3.7351528935, -0.3144621365), align=None, mode=Mode.SUBTRACT)
    extrude(amount=-F4_DEPTH)


solid = Compound([f1.part, f2.part, f3.part, f4.part])
